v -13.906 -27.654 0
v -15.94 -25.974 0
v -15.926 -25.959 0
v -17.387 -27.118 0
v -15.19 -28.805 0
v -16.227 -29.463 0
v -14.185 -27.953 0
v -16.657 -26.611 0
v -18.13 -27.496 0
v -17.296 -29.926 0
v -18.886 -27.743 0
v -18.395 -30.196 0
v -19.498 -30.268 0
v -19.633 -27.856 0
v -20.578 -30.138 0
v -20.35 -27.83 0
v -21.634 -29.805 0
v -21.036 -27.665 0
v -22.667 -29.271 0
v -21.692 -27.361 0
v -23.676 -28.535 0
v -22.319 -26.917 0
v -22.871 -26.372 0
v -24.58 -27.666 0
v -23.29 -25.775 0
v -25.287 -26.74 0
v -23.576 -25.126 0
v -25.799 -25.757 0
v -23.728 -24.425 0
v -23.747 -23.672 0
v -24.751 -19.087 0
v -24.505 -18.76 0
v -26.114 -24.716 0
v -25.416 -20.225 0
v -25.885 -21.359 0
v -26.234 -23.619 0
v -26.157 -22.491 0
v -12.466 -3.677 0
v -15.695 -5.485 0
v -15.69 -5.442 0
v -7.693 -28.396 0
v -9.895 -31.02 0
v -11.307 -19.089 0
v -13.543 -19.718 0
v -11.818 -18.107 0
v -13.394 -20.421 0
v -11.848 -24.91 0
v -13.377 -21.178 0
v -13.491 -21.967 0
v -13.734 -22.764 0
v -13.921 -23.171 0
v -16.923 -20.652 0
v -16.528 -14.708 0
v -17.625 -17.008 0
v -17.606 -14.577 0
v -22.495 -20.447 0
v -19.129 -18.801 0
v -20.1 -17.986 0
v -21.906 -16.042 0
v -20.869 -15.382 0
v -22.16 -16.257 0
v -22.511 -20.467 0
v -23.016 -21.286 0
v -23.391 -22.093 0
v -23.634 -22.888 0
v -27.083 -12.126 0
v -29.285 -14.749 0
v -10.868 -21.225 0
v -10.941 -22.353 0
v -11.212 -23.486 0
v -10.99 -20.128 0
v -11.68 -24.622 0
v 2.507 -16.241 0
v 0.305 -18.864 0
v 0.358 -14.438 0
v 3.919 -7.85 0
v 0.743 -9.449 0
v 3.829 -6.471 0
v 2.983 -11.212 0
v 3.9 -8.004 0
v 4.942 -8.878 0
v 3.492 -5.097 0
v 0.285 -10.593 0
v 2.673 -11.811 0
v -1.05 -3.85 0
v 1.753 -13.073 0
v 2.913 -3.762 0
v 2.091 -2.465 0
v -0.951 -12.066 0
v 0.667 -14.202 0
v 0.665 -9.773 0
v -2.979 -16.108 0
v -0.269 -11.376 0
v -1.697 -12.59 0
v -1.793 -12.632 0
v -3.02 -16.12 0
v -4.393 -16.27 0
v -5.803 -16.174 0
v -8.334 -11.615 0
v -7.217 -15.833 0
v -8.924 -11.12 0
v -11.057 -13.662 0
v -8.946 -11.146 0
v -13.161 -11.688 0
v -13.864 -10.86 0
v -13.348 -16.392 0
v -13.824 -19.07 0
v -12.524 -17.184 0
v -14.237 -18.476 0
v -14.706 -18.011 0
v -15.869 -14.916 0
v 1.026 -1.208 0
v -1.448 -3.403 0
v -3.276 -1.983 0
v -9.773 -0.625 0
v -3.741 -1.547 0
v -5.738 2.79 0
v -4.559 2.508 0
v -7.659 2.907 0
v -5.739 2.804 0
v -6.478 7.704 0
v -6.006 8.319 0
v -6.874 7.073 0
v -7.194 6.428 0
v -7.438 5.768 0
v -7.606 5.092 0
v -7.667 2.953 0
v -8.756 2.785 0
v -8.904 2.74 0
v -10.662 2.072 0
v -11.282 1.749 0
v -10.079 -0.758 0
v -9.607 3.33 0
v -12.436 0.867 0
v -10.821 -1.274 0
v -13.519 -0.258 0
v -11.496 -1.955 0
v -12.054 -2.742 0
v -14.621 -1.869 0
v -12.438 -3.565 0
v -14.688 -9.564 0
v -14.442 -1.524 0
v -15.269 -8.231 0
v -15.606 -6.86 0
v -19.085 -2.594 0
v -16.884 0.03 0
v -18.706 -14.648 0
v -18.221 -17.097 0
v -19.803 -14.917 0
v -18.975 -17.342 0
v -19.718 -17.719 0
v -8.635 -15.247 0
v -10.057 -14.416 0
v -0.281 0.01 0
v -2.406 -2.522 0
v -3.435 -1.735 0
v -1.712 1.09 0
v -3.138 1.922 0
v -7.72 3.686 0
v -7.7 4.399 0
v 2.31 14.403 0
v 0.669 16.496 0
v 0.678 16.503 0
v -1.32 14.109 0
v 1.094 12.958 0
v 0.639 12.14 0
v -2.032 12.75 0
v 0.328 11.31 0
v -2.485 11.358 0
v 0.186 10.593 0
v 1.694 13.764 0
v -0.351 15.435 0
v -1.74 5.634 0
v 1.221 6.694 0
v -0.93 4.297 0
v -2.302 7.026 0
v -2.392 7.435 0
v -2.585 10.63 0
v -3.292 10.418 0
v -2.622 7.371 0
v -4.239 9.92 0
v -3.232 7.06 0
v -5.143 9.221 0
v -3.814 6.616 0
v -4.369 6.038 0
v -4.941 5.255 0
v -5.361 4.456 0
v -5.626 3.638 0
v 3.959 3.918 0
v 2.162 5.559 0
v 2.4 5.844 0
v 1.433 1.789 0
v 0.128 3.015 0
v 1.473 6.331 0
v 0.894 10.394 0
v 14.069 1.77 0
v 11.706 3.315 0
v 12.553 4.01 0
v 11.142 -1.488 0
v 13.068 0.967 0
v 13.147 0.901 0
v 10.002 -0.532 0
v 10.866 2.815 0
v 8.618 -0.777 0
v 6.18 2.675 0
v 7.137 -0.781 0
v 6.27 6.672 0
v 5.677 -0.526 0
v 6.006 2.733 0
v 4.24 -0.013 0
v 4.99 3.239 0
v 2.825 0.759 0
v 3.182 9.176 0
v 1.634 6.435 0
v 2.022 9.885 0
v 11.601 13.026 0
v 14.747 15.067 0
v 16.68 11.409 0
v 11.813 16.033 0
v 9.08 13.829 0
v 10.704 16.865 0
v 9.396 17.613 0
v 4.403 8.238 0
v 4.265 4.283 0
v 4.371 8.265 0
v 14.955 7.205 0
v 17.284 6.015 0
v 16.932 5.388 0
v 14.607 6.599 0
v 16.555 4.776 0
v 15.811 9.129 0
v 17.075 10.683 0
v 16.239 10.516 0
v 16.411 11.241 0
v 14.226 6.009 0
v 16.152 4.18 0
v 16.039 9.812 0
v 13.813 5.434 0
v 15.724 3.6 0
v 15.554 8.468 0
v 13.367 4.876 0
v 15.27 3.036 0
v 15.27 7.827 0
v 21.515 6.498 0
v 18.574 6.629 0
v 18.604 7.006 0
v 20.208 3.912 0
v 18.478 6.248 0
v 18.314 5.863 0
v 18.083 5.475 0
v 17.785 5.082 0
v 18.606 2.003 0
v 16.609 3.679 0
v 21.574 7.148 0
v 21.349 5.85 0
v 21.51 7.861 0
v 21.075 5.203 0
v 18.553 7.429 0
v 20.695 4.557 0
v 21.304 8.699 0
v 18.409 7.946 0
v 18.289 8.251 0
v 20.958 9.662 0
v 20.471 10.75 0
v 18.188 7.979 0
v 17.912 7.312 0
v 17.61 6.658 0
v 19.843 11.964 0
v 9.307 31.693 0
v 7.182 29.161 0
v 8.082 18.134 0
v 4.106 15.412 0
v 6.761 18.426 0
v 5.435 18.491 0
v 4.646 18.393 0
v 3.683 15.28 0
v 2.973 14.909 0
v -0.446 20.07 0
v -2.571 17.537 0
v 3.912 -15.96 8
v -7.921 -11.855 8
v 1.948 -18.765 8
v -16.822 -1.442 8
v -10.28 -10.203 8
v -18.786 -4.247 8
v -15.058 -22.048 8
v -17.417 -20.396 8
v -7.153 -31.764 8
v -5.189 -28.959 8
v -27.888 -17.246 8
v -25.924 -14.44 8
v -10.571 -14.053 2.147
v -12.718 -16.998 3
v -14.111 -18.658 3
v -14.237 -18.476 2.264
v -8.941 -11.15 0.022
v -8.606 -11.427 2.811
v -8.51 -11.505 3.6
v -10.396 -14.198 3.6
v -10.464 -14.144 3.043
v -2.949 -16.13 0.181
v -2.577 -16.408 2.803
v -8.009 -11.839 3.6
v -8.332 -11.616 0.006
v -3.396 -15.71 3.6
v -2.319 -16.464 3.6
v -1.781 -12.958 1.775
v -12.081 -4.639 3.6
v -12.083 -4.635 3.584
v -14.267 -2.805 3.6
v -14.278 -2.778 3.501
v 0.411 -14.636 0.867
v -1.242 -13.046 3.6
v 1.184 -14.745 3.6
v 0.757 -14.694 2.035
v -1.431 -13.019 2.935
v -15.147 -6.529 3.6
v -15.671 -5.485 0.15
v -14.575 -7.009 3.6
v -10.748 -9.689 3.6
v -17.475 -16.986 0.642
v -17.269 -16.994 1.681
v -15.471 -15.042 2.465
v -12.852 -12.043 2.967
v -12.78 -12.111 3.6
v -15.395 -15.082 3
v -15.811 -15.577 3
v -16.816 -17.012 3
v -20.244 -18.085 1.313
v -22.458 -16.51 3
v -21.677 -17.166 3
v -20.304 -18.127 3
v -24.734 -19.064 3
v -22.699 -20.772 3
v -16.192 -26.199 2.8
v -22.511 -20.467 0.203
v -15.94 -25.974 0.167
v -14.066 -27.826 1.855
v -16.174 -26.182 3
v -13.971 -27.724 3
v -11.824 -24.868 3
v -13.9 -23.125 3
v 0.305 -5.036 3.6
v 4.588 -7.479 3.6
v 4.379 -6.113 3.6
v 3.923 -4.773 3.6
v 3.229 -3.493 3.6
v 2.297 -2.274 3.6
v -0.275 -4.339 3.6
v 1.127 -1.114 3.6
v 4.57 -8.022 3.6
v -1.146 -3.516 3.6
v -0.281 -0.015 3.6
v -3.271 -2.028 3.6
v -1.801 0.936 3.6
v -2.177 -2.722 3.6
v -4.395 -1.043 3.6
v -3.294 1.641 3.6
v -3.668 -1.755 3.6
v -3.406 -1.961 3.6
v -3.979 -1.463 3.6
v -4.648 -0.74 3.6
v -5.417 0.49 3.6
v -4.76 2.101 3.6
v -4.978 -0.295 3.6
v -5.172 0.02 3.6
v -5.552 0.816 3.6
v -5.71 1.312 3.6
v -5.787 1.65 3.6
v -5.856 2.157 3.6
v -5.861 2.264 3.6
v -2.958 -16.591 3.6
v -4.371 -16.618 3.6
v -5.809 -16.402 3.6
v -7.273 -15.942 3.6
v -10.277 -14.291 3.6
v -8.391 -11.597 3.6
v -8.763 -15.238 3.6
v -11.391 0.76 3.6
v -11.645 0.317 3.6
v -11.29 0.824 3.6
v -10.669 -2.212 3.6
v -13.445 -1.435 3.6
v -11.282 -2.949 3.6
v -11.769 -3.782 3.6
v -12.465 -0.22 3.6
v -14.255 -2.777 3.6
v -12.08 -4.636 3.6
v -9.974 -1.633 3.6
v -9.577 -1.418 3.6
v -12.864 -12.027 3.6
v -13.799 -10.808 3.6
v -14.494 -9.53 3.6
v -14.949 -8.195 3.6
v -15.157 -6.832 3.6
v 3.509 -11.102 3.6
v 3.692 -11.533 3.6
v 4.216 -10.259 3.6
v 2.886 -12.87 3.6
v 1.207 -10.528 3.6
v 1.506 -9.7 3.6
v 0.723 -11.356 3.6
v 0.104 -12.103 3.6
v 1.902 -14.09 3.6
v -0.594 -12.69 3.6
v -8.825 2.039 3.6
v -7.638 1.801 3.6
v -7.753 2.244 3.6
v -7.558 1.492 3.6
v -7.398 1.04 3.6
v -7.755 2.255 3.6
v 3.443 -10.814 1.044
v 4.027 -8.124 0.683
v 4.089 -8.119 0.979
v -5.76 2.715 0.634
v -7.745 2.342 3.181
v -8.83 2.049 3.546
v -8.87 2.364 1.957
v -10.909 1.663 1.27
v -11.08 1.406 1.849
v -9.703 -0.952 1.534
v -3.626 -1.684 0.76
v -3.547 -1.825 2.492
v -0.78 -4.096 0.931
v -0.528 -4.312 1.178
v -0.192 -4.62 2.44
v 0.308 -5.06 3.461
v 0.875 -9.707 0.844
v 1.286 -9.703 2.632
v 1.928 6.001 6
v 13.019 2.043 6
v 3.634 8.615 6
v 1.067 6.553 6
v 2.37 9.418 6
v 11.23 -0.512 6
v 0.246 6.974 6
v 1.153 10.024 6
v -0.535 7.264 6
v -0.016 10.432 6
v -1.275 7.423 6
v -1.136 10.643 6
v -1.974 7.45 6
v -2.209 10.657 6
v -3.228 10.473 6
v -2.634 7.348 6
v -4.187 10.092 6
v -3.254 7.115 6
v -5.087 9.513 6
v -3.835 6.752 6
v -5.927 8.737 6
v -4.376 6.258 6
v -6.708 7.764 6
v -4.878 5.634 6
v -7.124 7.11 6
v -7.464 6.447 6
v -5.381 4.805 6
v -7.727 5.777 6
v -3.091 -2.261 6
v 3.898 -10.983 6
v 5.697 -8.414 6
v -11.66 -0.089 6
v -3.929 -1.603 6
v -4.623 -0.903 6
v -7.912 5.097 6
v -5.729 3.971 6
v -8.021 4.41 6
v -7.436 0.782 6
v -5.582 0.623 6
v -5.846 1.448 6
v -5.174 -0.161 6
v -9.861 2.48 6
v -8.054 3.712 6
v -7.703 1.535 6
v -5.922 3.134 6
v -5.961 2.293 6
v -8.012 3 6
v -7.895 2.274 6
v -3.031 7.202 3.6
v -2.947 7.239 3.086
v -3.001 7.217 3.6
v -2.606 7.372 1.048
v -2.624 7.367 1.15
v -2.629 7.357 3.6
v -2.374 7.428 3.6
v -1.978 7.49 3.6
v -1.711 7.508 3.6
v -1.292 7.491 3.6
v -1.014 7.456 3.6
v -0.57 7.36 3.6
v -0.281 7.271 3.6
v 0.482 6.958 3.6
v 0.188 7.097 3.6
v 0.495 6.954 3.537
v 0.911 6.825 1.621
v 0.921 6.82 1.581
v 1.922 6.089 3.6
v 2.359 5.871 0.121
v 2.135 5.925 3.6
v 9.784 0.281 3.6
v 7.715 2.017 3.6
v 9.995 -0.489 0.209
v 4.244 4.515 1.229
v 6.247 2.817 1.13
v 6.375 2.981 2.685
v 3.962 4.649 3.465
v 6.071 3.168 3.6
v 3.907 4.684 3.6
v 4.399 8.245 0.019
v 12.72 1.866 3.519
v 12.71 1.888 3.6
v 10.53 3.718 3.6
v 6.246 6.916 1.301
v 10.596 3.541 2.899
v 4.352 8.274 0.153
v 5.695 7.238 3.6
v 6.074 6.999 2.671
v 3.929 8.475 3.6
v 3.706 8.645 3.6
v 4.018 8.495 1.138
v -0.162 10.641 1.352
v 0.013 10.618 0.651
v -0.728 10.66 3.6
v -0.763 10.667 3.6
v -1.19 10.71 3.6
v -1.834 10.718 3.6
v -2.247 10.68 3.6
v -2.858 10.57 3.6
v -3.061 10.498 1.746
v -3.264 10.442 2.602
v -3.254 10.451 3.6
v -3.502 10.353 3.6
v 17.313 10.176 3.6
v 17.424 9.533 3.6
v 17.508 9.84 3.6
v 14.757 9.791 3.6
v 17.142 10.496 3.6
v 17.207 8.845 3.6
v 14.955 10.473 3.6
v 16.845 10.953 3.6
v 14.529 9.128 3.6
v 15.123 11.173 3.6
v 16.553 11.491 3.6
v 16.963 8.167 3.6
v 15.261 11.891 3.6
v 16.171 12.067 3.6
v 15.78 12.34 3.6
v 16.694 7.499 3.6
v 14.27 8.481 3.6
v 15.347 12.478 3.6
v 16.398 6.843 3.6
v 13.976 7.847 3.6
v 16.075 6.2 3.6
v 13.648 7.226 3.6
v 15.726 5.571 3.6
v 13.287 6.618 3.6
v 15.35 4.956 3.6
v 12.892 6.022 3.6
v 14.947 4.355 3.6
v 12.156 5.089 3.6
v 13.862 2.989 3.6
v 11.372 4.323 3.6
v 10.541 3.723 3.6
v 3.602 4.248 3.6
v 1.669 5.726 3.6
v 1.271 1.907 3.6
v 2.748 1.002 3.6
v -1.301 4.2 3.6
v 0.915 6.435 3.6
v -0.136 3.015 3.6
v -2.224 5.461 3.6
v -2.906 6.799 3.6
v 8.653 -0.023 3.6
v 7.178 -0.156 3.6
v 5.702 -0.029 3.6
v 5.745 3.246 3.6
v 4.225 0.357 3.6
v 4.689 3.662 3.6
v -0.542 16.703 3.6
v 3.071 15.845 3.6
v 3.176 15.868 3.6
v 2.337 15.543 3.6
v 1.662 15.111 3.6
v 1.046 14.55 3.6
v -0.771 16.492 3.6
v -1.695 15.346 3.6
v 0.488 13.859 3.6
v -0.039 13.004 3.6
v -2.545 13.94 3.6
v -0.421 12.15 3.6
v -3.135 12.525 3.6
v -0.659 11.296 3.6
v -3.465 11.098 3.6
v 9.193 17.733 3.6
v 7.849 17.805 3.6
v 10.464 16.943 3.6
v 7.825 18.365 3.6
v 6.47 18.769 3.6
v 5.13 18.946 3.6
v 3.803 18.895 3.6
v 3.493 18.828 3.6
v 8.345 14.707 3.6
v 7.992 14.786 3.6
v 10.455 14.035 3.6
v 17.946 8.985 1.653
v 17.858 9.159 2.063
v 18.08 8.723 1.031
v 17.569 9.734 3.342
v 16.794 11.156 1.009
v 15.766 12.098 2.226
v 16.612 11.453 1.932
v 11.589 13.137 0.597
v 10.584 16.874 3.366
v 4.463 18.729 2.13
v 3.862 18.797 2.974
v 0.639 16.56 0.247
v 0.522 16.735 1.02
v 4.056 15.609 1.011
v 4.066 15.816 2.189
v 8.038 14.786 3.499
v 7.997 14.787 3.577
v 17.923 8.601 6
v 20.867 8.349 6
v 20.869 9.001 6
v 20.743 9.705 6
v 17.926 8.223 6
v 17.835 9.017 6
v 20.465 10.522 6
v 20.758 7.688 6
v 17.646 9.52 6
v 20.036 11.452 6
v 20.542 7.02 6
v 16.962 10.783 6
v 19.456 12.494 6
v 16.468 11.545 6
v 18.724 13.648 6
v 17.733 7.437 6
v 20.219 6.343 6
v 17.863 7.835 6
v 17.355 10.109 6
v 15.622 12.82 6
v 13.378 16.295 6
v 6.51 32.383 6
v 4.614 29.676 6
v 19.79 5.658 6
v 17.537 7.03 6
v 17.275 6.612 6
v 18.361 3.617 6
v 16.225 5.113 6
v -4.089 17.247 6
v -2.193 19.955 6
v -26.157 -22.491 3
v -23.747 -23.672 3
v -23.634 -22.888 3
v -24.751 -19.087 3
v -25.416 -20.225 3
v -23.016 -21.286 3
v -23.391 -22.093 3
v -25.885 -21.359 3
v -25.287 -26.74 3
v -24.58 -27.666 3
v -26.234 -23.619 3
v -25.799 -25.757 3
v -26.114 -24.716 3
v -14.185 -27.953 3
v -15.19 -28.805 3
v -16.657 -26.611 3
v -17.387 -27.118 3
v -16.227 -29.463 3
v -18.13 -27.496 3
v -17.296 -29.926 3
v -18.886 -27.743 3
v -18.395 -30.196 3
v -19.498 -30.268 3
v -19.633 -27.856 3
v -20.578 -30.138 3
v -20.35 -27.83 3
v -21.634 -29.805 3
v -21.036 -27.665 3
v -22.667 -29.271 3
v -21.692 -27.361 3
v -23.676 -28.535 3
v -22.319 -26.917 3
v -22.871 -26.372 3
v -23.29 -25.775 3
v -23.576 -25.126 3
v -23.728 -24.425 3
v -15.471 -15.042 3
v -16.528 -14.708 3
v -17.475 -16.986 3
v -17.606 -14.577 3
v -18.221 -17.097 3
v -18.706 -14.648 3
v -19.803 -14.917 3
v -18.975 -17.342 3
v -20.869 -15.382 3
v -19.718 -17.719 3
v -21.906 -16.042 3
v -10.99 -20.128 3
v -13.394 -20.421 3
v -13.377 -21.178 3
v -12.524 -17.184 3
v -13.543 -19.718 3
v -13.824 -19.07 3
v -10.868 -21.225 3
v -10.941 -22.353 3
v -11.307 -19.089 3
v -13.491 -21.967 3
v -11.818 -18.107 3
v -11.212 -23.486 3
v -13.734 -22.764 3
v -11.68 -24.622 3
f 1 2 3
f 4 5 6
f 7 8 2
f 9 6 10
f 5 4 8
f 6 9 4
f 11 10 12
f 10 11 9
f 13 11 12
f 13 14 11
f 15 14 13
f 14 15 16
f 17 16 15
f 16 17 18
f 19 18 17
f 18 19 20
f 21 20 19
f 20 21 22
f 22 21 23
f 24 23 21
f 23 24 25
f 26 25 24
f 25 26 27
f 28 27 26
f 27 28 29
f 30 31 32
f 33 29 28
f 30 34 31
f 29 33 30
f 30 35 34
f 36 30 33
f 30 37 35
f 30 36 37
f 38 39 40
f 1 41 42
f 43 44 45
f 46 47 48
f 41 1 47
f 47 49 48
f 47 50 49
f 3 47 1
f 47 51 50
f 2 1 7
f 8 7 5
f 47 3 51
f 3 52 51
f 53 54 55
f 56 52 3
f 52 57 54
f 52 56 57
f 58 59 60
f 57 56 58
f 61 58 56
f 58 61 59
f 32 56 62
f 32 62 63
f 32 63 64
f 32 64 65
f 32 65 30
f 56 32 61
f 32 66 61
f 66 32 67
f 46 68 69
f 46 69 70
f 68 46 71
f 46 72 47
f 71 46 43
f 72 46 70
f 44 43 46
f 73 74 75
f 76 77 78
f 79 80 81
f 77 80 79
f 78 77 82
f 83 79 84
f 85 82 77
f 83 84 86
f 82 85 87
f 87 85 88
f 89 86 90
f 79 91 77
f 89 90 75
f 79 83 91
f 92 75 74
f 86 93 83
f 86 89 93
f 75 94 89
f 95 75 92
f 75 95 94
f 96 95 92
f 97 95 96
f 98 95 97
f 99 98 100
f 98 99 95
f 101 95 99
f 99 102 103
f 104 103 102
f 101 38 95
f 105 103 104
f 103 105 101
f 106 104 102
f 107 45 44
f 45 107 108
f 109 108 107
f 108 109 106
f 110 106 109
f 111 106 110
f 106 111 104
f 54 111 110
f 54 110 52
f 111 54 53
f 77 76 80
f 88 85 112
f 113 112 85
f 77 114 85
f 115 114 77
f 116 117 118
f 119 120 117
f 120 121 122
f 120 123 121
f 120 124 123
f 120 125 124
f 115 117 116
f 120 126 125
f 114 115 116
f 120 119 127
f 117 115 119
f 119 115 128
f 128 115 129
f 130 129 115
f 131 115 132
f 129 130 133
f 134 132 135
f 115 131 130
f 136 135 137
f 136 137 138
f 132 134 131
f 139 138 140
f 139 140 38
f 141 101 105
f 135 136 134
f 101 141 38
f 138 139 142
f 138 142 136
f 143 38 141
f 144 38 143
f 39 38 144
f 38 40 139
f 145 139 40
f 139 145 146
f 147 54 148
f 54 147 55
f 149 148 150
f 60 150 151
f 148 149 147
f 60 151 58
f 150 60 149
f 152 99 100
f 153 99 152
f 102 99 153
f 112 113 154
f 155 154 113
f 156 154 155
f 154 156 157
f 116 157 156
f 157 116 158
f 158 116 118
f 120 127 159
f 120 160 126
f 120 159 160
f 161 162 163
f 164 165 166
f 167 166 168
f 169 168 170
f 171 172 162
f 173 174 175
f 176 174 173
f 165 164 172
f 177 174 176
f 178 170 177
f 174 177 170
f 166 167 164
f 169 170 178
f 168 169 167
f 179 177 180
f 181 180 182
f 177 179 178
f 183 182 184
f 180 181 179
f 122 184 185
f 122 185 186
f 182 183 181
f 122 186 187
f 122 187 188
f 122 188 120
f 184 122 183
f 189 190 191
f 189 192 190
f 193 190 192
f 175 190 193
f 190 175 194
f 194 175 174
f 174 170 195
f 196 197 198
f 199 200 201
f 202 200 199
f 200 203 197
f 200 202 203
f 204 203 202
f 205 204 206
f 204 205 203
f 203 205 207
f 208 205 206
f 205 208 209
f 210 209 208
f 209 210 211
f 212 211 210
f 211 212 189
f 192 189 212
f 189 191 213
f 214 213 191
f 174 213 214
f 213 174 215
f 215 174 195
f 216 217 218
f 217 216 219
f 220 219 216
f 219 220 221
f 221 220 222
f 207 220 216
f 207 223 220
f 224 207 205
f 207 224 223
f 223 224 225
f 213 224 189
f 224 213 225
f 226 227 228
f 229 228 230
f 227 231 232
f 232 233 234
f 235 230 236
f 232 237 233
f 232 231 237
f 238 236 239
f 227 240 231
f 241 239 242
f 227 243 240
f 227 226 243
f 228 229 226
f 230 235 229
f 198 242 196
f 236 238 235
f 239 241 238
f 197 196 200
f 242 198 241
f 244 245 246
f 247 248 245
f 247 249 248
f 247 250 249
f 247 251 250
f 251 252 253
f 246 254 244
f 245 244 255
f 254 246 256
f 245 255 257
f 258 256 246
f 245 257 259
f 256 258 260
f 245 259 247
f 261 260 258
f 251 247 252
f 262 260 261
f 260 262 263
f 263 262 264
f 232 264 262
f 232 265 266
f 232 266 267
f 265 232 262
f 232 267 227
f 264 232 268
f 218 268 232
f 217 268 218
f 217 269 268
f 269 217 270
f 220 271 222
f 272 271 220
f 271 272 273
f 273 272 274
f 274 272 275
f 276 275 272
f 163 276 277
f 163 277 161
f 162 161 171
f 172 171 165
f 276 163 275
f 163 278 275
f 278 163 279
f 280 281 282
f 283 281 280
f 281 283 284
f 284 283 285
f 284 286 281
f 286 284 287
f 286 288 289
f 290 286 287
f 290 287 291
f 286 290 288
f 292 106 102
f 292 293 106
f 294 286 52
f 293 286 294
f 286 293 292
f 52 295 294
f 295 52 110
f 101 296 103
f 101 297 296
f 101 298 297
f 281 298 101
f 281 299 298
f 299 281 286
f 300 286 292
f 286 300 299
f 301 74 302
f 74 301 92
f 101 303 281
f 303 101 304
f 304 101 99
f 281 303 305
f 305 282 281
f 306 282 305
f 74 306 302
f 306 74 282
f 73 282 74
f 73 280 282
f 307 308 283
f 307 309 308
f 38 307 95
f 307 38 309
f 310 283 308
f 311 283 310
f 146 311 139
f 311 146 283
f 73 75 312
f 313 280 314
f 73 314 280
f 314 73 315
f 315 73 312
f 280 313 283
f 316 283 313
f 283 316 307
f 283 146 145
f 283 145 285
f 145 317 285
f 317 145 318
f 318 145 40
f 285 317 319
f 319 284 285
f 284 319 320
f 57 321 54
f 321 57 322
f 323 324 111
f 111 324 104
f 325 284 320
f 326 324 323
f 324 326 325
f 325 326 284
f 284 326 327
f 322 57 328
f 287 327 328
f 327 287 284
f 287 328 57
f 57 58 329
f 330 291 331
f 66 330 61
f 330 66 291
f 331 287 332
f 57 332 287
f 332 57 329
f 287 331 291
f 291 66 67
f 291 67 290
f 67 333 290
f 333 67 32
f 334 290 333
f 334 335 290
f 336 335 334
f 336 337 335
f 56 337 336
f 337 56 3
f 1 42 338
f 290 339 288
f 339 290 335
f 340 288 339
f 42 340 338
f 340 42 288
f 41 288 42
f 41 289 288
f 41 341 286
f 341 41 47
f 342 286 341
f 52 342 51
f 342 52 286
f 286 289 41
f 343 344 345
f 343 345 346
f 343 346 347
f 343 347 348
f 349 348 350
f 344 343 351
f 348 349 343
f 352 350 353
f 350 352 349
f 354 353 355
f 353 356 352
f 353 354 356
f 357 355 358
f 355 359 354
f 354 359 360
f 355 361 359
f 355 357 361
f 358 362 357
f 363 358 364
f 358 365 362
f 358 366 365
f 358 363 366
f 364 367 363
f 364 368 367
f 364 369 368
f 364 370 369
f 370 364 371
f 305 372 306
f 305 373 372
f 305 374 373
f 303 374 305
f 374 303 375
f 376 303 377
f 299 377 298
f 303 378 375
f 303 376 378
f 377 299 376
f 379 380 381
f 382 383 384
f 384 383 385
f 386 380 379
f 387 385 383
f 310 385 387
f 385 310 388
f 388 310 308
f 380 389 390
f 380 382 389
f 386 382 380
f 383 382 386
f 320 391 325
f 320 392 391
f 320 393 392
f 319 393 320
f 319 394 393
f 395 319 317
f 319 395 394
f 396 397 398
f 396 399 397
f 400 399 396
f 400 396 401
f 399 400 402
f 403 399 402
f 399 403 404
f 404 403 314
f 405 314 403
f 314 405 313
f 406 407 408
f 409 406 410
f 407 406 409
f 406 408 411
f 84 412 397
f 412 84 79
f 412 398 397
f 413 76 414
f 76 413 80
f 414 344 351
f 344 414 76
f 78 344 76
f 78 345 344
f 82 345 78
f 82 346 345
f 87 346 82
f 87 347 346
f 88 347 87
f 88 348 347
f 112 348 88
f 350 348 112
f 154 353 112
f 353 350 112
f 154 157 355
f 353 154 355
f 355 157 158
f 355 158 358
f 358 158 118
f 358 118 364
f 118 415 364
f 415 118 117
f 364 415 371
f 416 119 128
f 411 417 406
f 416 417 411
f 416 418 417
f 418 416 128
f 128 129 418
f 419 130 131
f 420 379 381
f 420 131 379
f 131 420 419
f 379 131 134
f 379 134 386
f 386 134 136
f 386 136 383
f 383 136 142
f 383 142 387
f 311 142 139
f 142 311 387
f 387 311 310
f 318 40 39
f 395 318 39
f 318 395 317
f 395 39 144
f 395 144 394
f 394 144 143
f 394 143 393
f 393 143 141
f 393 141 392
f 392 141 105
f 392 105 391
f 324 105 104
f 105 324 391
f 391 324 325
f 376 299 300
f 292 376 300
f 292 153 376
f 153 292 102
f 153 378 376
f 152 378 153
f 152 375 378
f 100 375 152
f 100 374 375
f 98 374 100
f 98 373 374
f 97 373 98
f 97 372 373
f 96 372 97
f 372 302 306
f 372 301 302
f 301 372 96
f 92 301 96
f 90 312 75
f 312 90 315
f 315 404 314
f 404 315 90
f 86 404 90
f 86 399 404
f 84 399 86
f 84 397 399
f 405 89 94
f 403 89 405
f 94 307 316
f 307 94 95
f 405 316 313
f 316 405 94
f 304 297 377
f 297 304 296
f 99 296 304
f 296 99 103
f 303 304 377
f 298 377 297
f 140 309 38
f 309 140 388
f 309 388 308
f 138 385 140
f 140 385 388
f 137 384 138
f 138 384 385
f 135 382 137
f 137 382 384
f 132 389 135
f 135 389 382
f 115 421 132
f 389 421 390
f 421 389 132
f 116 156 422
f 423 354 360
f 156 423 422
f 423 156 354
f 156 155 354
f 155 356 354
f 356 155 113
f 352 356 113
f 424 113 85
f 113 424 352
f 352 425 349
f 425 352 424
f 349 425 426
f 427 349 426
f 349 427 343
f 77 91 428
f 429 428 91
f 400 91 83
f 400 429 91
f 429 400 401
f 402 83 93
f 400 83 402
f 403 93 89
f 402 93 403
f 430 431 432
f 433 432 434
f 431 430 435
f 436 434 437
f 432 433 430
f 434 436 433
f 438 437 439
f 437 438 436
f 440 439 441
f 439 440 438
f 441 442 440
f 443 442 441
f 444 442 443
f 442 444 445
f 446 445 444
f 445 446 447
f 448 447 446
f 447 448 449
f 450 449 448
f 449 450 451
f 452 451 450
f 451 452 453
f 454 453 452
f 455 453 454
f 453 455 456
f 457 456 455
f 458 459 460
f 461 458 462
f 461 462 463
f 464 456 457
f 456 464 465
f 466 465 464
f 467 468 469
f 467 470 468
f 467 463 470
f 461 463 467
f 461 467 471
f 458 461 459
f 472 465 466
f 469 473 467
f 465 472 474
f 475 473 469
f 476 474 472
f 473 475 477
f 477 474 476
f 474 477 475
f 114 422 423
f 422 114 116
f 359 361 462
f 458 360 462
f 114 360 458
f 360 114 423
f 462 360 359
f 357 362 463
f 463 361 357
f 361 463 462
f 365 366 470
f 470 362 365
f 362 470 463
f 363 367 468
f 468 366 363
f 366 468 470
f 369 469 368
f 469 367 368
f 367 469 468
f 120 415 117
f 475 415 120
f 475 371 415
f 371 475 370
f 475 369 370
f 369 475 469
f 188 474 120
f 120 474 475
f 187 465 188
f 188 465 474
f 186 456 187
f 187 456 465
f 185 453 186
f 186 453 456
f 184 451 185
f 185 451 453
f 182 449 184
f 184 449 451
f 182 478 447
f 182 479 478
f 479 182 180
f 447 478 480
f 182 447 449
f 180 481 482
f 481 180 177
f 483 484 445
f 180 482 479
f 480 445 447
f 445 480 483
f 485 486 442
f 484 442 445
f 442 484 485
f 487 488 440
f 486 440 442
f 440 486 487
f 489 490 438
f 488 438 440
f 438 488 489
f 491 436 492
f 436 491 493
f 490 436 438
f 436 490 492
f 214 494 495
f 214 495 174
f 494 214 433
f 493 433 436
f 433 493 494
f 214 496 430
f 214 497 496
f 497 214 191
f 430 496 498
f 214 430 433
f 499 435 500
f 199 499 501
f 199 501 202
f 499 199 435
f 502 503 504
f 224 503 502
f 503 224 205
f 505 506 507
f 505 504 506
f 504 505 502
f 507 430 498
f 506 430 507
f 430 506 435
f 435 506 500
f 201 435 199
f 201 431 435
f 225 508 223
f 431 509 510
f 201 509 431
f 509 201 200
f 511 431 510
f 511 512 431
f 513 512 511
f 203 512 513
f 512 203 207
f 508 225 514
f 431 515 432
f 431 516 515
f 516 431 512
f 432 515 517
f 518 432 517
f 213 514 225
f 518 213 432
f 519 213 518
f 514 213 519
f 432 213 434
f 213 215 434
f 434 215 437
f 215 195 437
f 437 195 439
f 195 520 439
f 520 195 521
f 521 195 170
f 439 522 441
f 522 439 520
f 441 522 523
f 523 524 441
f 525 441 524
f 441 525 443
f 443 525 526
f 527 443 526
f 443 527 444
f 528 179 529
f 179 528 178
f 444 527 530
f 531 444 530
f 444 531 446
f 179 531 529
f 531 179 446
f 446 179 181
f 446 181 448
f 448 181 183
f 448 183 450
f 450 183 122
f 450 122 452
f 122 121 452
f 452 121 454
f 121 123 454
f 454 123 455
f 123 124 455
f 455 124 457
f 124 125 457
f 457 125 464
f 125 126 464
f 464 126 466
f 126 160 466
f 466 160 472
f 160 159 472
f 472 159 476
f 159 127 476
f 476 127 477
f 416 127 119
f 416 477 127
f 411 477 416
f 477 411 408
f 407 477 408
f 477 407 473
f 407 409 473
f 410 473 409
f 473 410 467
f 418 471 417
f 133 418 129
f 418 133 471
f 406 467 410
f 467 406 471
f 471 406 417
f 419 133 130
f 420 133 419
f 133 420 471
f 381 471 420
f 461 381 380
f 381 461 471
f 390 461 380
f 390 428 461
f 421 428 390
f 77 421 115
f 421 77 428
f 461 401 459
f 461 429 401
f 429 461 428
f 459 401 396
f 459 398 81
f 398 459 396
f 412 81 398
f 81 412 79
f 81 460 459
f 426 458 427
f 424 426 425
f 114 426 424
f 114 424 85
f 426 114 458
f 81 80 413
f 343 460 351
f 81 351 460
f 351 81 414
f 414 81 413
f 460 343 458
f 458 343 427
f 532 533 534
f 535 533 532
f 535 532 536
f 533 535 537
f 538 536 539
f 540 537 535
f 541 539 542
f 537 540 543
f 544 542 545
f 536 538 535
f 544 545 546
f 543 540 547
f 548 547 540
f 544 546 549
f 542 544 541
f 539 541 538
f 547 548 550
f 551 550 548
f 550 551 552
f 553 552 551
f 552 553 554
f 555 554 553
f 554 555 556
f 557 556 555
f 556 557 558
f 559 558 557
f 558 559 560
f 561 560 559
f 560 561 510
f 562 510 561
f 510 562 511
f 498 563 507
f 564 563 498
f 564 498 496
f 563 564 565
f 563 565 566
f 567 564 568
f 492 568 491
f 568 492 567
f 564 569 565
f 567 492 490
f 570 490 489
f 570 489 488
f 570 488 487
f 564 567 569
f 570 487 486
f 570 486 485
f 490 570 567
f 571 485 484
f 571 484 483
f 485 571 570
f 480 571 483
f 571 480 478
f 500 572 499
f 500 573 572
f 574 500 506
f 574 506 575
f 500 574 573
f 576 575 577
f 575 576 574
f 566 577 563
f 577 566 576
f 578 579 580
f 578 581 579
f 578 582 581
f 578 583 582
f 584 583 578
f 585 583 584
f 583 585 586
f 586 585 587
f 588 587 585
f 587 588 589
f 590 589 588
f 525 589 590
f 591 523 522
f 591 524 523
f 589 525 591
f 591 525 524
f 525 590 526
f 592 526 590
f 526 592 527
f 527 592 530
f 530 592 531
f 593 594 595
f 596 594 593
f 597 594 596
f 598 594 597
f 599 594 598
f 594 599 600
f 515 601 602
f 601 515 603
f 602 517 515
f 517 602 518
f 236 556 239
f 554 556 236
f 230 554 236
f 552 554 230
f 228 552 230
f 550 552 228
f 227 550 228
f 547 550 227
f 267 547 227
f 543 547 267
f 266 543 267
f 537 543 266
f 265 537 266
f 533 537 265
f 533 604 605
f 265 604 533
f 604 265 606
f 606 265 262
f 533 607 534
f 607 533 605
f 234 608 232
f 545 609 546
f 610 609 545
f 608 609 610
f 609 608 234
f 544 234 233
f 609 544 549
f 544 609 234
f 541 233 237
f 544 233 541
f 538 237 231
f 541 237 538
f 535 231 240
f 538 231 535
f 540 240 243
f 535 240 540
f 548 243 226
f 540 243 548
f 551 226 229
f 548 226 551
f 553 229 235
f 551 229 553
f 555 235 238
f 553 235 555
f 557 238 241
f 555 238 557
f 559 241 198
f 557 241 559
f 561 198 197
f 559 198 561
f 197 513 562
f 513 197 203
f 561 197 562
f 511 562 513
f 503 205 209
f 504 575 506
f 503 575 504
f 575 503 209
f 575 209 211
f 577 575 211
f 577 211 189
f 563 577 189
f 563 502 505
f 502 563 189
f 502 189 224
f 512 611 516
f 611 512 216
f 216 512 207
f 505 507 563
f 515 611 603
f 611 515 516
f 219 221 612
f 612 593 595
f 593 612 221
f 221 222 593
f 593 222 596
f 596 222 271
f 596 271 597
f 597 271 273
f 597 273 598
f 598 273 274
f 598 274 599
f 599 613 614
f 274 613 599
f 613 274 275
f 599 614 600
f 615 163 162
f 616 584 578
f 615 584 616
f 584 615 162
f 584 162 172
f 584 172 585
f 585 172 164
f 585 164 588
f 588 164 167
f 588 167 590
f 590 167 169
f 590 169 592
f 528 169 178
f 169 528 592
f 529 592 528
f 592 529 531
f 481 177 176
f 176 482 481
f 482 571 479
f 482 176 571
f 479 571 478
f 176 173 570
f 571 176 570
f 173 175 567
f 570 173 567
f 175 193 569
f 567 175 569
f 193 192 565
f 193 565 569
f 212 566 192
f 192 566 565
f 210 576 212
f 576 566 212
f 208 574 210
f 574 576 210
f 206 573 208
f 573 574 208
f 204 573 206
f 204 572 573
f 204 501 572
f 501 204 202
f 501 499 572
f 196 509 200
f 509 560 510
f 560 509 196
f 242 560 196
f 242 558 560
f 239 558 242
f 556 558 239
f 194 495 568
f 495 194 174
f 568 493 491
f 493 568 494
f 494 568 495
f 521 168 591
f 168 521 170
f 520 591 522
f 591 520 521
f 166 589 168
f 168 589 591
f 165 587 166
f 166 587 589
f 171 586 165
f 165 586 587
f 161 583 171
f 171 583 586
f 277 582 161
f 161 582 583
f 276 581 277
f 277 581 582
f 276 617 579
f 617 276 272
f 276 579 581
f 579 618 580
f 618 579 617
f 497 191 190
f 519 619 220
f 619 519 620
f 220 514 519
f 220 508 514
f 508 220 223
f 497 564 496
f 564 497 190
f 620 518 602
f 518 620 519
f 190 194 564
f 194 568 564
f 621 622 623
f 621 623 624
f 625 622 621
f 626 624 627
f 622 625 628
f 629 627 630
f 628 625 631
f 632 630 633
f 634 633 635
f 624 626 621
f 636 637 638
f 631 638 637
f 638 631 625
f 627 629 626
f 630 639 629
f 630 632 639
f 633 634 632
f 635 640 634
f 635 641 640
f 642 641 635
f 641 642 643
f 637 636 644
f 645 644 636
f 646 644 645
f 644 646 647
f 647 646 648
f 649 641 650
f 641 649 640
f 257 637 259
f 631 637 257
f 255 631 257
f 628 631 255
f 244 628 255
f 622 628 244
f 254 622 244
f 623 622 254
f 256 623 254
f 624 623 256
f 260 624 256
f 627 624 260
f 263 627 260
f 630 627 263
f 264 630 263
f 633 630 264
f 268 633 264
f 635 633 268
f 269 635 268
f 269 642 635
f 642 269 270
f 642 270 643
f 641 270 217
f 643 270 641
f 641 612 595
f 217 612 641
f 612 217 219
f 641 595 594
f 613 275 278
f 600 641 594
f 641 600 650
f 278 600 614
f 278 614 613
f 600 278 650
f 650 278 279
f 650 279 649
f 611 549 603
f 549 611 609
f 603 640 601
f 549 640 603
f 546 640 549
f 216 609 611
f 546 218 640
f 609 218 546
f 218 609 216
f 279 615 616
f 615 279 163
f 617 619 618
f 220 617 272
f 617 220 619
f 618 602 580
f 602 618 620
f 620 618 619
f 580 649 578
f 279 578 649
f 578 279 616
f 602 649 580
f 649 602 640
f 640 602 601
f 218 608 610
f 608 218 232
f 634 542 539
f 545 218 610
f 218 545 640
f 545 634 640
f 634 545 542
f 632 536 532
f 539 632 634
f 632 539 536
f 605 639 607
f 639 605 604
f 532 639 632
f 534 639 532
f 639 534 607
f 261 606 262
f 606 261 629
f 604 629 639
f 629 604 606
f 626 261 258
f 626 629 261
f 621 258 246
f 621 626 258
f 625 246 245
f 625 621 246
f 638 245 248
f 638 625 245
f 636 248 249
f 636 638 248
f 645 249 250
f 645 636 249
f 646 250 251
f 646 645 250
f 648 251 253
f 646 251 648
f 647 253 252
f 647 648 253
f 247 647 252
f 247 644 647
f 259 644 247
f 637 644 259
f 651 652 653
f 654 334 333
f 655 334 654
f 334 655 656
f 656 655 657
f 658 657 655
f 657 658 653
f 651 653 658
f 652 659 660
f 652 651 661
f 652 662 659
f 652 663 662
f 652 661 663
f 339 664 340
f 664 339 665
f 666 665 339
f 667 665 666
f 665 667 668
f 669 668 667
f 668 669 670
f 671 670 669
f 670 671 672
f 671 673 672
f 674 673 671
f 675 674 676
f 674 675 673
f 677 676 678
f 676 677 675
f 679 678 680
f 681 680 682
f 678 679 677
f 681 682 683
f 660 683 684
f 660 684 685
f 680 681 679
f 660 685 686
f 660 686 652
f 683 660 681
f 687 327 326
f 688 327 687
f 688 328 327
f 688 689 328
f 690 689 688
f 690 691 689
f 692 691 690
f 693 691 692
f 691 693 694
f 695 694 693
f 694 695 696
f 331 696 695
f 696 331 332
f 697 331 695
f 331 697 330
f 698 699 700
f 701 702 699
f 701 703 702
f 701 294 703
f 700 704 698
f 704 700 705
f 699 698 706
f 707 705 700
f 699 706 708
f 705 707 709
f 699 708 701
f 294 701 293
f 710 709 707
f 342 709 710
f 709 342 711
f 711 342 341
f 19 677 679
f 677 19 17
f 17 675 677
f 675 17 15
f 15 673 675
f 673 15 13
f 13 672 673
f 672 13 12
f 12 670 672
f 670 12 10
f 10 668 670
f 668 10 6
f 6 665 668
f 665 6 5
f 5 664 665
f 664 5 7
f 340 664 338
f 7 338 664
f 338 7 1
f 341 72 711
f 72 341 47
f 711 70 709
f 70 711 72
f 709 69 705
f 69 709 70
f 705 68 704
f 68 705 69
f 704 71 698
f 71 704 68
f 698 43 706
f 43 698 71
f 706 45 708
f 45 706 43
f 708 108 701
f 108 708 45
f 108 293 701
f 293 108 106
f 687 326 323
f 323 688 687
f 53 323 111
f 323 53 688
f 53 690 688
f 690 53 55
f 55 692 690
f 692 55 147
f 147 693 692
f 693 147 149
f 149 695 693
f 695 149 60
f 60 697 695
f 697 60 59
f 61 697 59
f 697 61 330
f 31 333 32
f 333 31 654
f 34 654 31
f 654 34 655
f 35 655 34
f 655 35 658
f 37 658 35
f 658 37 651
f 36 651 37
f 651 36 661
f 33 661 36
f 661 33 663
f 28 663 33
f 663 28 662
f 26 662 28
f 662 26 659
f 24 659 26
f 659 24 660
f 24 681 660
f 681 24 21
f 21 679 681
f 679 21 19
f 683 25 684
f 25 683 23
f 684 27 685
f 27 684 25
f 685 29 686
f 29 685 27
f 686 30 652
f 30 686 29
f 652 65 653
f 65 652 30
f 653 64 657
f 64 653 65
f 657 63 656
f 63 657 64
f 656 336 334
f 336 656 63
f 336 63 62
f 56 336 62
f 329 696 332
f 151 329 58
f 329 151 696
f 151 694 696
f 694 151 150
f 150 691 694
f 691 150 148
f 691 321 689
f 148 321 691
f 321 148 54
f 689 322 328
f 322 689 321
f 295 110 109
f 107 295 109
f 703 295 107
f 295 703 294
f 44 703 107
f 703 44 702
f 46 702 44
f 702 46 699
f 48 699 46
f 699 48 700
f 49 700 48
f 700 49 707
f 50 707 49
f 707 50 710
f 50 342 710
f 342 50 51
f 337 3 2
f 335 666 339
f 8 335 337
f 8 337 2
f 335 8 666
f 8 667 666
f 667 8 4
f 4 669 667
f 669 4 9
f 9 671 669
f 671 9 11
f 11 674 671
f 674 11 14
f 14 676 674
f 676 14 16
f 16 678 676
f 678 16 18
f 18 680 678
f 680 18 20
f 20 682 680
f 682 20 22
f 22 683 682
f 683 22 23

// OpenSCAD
Font_name = "Chewy";
Text = "Honey";
Rotation = 50;
Connect_dots = true;
Dot_bridge_height_percent = 40;

function char_w(c) = 
    (c == "m" || c == "w") ? 15.0 :
    (c == "i" || c == "l" || c == "j" || c == "t" || c == "f") ? 7.5 :
    (c >= "A" && c <= "Z") ? 14.0 :
    10.5;

function get_step_at(text, i) = 
    (i <= 0) ? 0 :
    ((char_w(text[i-1]) + char_w(text[i])) / 2 * 0.95);

function get_char_x_auto(text, i) = 
    (i <= 0) ? 0 : (get_char_x_auto(text, i - 1) + get_step_at(text, i));

span = get_char_x_auto(Text, len(Text)-1);
cx = span / 2;
loop_x = -cx - 8.5;
loop_y = 0;
twist = -5;
$fn = 32;

rotate([0, 0, Rotation]) {
    union() {
        // Loop
        color("DimGray")
        linear_extrude(height = 3, $fn = $fn)
            translate([loop_x, loop_y, 0]) rotate([0, 0, -90])
                text(size = 20, text = "o", font = Font_name, halign = "center", valign = "center", $fn = $fn);

        // Letters
        for (i = [0 : len(Text) - 1]) {
            h = (i == 0) ? 8.0 : ((i % 2 == 0) ? 6.0 : 3.6);
            char = Text[i];
            char_x = get_char_x_auto(Text, i) - cx;

            color([0.92, 0.72, 0.1]) {
                // Main letter extrusion (full height h)
                linear_extrude(height = h, twist = twist, $fn = $fn)
                    translate([char_x, 0, 0])
                        text(size = 25, text = char, font = Font_name, halign = "center", valign = "center", $fn = $fn);

                // Recessed bridge at 40% height (retains strength, preserves top surface aesthetics)
                if (Connect_dots) {
                    bridge_factor = Dot_bridge_height_percent / 100;
                    bridge_h = h * bridge_factor;
                    bridge_twist = twist * bridge_factor;
                    if (char == "i") {
                        linear_extrude(height = bridge_h, twist = bridge_twist, $fn = $fn)
                            translate([char_x, 0, 0])
                                translate([-1.2, 6.5]) square([2.4, 4.0]);
                    }
                    if (char == "j") {
                        linear_extrude(height = bridge_h, twist = bridge_twist, $fn = $fn)
                            translate([char_x, 0, 0])
                                translate([-1.2, 11.0]) square([2.4, 4.0]);
                    }
                }
            }
        }
    }
}
